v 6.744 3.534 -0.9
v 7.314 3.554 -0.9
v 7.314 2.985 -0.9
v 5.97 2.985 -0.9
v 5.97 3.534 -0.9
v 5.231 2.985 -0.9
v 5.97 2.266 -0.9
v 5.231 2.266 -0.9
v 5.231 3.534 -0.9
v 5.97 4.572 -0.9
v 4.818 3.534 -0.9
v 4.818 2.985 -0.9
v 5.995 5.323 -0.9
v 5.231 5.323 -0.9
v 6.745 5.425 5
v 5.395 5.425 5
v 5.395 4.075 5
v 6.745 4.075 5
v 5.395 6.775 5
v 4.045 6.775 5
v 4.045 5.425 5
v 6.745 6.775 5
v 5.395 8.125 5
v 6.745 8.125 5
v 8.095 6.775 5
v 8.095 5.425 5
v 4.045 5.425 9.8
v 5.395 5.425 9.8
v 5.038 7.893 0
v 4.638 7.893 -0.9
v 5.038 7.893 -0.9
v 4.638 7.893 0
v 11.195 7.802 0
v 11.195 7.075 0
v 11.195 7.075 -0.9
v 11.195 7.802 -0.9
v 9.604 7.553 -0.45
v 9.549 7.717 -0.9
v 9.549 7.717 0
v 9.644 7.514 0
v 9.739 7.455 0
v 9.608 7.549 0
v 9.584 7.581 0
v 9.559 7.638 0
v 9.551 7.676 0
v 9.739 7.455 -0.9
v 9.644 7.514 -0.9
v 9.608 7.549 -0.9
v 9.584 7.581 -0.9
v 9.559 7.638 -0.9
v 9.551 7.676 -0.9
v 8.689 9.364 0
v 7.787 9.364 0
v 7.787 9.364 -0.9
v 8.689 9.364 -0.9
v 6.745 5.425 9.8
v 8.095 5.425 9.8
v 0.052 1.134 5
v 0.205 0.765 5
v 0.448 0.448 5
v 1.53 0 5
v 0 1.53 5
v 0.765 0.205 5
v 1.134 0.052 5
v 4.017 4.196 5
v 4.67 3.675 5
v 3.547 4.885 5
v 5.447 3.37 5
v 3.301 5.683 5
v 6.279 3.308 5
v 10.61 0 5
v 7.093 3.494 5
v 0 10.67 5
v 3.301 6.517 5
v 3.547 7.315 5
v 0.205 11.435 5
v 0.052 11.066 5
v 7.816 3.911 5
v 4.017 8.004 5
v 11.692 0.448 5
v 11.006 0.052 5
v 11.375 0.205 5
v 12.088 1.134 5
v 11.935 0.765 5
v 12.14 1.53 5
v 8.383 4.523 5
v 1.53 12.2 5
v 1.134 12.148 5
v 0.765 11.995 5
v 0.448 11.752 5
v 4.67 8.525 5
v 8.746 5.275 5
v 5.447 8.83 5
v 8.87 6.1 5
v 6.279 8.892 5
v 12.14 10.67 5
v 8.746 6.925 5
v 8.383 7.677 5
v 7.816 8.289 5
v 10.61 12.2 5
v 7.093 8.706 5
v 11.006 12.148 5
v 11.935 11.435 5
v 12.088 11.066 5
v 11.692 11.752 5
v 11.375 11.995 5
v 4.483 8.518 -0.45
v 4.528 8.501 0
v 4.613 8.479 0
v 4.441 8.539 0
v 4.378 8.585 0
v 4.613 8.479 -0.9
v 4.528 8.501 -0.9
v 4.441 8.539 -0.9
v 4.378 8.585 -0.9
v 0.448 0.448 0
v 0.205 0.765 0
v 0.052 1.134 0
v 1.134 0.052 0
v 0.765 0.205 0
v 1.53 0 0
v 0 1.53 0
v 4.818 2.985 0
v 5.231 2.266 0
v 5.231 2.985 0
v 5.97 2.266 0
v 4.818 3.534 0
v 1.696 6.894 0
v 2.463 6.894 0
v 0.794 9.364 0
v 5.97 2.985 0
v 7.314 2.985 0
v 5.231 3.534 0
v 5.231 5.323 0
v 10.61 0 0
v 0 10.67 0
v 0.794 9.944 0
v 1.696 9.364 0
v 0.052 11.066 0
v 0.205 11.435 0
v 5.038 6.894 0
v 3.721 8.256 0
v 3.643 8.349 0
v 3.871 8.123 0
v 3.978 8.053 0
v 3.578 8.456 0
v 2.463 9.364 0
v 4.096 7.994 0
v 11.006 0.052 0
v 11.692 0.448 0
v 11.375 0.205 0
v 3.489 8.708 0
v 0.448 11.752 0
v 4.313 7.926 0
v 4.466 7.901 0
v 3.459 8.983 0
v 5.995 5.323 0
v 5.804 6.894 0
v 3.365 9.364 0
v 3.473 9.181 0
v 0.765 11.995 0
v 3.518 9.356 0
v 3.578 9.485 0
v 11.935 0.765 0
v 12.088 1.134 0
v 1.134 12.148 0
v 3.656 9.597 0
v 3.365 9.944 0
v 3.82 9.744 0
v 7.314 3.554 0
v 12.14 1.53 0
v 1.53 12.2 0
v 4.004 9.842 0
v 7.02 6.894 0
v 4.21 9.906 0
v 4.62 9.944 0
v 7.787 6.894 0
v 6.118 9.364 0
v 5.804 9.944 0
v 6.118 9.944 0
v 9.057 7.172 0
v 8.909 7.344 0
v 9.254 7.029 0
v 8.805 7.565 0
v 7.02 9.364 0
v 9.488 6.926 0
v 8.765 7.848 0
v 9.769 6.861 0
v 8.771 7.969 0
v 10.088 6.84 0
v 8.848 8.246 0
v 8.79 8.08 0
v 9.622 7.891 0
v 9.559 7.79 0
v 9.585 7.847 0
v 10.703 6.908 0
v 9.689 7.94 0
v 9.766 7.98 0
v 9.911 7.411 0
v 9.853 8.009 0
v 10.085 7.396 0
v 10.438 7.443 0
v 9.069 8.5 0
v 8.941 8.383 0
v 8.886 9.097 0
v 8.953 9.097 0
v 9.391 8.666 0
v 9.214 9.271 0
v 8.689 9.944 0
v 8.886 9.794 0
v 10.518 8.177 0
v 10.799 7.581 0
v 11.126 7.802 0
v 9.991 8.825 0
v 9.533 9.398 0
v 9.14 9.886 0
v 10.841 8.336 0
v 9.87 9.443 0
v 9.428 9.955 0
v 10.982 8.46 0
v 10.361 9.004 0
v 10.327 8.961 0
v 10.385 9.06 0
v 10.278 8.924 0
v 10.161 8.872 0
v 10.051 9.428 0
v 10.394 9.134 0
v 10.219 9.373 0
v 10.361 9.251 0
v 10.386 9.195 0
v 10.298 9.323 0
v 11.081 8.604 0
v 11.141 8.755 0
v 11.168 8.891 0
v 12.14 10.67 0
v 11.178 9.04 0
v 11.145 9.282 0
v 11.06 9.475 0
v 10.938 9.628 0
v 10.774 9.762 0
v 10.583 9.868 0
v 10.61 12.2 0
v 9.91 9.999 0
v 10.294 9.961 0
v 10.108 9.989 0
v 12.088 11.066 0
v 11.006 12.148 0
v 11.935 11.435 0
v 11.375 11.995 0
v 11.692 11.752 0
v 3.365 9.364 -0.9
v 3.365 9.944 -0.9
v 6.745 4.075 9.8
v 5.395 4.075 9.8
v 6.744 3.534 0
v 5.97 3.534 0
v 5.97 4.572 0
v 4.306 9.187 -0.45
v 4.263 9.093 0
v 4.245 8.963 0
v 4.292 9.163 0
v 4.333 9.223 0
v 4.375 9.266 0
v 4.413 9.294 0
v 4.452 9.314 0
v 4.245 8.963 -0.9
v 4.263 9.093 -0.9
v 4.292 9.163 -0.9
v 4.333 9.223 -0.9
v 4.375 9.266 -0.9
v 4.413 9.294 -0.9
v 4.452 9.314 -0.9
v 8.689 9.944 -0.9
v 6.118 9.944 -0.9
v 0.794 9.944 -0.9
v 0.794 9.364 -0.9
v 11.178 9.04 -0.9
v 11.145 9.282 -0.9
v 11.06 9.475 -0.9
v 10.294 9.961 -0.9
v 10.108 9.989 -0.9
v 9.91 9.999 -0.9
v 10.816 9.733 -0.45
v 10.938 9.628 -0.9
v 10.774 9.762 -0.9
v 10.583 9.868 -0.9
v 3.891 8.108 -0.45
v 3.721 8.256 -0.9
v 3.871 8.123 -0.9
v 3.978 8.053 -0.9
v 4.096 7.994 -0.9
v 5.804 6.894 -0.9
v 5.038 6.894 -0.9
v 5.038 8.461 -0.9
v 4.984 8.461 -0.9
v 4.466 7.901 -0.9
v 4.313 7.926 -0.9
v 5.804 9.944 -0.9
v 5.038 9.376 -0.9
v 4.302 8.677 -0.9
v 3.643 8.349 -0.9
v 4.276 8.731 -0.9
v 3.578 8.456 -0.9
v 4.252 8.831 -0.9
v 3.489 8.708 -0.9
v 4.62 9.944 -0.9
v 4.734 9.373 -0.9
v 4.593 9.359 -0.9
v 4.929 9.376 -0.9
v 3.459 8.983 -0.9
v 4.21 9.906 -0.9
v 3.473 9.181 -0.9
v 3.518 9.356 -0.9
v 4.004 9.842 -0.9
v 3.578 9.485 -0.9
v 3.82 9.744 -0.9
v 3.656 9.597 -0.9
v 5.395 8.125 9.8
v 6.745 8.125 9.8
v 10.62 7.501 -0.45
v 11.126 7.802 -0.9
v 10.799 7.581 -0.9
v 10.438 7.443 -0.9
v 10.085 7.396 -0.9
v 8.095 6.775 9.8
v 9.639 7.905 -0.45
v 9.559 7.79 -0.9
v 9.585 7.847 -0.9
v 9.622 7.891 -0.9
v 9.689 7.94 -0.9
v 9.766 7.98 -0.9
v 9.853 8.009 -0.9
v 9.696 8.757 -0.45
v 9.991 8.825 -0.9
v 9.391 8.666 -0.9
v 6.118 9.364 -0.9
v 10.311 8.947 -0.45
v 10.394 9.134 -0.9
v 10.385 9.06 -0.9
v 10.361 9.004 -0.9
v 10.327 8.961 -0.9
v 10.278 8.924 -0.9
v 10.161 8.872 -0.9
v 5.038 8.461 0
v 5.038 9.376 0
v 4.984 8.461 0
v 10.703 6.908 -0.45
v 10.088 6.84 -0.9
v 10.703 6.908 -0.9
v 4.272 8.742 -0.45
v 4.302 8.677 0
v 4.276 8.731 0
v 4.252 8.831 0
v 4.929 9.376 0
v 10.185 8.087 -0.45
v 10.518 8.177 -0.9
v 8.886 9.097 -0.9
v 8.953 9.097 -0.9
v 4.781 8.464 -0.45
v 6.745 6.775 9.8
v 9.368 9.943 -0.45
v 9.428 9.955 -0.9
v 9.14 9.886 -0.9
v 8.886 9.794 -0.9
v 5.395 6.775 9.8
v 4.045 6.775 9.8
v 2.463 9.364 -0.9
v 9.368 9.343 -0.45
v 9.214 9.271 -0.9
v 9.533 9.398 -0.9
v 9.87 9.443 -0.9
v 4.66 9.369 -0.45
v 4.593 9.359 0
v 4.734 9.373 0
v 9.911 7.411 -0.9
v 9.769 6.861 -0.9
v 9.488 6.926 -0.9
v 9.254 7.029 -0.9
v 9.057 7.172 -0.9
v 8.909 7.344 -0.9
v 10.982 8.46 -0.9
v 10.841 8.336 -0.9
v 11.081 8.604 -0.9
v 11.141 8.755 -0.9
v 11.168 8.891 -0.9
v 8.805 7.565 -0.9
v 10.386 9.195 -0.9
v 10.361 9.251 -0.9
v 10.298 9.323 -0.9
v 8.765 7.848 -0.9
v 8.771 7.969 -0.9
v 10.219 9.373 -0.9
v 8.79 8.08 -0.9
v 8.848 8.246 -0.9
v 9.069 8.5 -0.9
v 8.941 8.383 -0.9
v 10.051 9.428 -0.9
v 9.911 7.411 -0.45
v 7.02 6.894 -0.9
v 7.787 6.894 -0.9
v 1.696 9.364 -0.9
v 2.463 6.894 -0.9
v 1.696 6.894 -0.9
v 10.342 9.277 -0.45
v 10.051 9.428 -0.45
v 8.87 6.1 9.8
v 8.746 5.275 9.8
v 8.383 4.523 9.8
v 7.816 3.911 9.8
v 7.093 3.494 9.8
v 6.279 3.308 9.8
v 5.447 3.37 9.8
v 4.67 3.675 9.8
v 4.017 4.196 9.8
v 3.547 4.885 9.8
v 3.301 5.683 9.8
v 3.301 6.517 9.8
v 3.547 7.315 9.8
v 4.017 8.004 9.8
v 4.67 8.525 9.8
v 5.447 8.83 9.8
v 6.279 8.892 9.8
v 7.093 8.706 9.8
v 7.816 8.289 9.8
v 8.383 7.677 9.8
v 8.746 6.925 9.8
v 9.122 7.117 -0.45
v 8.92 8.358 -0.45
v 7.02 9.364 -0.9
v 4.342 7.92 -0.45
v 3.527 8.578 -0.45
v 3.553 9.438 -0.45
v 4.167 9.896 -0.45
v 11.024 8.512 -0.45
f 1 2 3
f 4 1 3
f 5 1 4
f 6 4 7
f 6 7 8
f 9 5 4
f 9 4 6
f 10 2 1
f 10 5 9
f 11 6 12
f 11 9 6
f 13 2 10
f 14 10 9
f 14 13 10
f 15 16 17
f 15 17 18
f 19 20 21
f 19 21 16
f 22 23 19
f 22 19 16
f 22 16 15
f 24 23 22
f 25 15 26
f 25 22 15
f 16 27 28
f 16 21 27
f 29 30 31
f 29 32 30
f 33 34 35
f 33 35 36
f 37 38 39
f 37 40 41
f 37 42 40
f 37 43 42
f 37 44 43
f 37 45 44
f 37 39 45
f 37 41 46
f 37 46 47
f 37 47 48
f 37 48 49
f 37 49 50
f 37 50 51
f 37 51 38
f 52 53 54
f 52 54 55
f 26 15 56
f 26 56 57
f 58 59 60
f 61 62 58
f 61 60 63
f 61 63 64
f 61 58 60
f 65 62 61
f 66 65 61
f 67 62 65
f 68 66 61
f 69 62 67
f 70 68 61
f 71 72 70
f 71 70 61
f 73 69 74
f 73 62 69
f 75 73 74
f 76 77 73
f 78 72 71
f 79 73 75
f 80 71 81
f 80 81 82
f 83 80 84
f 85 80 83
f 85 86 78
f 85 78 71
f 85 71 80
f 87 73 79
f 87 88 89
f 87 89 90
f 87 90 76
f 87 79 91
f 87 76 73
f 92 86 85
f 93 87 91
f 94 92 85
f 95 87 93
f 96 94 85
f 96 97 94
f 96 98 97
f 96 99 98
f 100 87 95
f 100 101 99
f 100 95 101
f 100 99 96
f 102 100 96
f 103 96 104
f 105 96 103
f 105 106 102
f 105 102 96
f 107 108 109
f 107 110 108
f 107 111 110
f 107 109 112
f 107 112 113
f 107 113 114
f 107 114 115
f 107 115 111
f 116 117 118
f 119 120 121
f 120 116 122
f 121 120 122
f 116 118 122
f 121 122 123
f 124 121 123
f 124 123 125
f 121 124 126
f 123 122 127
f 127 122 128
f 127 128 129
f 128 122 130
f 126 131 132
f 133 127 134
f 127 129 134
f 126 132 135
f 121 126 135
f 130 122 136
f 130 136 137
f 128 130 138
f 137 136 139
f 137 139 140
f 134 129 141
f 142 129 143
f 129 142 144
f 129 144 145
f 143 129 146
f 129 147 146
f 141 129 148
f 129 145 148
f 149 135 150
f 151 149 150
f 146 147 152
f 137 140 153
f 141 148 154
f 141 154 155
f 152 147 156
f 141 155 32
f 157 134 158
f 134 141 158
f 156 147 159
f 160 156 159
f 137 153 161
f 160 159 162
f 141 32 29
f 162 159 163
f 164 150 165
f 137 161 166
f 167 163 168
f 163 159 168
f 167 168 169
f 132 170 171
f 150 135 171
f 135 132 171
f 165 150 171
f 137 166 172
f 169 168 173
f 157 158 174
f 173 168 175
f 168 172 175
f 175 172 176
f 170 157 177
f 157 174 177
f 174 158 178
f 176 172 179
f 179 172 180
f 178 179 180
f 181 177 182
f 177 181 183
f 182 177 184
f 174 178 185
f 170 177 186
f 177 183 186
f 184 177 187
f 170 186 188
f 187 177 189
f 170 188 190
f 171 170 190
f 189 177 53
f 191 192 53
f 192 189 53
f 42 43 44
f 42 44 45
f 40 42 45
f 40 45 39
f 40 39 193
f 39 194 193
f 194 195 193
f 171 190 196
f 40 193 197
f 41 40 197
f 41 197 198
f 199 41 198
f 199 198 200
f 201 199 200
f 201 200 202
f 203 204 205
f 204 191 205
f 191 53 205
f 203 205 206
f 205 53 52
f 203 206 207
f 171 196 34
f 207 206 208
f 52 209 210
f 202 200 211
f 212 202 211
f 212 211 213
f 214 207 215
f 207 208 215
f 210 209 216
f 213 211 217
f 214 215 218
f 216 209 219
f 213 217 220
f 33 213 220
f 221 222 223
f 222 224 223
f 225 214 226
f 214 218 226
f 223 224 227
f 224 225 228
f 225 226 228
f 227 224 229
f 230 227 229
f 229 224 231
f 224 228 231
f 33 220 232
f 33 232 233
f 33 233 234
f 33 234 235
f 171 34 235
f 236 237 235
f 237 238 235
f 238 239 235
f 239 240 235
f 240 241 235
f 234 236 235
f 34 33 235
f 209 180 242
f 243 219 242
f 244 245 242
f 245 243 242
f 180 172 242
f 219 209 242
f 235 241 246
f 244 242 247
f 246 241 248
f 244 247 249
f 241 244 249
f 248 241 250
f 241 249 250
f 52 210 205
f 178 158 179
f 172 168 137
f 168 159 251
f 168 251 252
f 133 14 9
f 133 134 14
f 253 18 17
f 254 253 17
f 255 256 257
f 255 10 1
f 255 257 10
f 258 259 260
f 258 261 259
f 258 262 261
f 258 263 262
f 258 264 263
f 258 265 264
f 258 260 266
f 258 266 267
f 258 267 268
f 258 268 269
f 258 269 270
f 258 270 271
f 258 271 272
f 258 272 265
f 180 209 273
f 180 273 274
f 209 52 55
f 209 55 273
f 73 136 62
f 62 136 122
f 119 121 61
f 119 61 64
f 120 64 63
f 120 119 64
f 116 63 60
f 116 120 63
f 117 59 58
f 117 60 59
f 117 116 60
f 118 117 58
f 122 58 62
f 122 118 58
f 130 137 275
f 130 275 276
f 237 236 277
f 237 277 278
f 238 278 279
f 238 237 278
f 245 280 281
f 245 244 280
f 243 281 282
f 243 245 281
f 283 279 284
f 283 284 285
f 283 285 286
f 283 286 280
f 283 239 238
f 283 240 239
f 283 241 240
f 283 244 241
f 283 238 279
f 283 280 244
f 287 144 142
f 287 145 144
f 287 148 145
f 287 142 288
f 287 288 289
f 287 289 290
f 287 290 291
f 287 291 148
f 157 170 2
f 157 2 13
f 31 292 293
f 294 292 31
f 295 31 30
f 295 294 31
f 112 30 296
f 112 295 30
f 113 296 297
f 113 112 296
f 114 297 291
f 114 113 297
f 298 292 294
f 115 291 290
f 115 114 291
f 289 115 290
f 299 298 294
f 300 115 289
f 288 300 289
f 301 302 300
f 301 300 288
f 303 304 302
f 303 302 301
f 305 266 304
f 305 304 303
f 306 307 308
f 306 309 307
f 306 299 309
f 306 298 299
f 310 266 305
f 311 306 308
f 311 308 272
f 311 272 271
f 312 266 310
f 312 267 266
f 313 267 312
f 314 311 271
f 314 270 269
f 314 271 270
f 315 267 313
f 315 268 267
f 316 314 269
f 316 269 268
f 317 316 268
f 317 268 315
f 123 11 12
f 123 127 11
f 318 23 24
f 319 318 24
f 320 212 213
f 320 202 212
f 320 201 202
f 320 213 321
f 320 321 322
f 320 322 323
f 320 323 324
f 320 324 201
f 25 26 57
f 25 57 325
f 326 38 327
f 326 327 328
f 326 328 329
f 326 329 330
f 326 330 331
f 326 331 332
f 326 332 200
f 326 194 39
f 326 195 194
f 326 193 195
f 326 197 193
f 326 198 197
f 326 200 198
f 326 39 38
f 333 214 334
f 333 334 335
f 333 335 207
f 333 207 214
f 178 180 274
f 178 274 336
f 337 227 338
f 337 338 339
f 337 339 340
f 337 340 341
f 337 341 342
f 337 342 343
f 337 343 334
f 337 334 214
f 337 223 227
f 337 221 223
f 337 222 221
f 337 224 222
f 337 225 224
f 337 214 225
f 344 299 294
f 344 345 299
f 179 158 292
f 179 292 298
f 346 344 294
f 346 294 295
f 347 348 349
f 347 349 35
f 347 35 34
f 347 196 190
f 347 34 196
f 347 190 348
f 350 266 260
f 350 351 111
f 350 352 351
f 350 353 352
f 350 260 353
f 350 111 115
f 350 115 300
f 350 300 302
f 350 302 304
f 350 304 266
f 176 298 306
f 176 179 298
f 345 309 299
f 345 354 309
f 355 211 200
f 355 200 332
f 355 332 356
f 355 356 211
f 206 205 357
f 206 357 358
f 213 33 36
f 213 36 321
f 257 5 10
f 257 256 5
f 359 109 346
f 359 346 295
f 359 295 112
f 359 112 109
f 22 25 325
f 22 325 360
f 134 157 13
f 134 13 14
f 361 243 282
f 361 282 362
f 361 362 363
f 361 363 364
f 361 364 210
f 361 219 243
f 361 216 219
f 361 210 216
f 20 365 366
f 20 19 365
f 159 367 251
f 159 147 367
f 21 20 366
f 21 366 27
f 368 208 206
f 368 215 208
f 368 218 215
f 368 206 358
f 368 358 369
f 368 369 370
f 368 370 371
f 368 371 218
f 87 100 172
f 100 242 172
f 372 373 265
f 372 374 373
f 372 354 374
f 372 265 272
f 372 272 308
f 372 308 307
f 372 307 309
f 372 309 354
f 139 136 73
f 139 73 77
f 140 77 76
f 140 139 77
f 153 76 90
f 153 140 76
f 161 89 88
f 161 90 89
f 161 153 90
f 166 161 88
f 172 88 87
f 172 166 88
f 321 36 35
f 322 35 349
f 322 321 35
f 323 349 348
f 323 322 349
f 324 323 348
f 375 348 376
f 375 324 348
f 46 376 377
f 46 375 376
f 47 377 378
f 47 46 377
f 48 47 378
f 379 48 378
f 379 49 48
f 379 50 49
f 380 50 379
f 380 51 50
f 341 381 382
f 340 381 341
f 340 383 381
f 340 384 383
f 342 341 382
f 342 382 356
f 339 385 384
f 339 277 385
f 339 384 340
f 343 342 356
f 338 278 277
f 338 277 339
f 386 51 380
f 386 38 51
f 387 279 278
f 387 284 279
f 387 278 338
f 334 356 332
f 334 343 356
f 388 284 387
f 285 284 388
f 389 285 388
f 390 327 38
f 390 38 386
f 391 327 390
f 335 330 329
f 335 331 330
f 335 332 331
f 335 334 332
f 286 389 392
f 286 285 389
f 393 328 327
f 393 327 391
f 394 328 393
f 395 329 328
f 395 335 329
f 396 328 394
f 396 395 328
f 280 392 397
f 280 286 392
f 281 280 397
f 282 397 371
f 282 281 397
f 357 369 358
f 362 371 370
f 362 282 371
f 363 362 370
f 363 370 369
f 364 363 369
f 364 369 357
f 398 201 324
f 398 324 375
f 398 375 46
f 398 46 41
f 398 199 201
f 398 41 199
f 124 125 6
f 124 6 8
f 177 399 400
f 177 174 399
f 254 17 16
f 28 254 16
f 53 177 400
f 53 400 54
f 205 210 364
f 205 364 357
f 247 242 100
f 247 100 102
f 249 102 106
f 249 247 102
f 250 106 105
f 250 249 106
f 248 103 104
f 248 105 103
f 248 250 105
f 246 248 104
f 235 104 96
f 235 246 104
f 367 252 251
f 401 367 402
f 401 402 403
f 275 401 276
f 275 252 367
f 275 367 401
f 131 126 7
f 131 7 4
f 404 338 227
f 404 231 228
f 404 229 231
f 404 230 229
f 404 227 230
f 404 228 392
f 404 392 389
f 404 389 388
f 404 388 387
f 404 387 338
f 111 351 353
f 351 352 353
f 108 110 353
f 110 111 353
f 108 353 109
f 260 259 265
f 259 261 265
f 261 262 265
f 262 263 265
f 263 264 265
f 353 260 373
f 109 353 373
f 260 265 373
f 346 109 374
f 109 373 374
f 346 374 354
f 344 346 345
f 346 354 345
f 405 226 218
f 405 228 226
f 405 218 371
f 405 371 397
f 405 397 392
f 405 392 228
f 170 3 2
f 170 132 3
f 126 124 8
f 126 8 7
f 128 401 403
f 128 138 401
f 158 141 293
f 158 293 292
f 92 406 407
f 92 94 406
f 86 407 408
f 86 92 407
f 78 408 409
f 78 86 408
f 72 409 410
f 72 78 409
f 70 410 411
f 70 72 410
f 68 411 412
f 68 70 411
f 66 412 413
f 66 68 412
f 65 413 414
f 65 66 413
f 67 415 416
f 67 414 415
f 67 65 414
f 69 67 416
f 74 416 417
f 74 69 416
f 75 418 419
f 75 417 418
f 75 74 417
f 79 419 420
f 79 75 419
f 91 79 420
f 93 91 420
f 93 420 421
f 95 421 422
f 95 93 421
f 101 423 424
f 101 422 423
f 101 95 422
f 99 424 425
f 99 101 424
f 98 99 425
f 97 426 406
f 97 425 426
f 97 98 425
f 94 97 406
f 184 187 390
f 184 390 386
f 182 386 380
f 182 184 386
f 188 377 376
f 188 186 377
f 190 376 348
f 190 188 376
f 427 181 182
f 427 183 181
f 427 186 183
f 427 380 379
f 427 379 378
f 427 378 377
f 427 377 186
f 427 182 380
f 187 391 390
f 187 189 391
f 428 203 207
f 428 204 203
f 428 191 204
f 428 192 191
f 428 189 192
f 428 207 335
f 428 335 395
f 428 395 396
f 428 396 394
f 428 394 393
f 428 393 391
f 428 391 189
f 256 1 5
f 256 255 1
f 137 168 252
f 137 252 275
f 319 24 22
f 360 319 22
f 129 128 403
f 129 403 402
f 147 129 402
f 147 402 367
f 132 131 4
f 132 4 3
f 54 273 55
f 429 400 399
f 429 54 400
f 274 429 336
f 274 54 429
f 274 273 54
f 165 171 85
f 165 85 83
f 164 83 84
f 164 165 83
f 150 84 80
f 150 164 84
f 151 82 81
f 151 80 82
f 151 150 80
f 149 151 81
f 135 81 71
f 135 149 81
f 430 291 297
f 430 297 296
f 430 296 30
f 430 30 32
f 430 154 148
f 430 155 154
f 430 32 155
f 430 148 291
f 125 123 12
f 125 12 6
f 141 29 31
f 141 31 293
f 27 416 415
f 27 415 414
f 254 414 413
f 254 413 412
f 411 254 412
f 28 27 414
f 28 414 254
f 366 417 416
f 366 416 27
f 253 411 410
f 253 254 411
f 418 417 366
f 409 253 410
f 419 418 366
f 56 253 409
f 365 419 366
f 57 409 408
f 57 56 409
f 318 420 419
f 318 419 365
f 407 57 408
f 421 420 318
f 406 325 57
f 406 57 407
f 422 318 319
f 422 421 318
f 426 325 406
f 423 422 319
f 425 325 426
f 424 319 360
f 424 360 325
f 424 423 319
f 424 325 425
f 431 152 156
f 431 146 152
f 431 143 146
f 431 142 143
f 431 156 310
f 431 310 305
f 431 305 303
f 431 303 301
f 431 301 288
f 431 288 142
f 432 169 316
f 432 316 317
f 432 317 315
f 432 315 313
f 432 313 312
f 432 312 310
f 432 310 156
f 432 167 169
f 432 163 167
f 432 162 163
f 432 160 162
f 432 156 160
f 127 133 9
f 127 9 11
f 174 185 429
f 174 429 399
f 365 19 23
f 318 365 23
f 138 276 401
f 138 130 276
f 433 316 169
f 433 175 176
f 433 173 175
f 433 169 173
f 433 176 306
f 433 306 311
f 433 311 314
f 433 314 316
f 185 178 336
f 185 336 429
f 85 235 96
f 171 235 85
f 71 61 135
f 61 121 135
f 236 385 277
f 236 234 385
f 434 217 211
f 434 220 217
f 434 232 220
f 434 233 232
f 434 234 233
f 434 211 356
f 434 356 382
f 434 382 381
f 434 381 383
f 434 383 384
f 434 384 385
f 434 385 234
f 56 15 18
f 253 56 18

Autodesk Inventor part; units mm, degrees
ref_plane "YZ Plane" through (0, 0, 0) normal (1, 0, 0) x (0, 1, 0)
ref_plane "XZ Plane" through (0, 0, 0) normal (0, 1, 0) x (-1, 0, 0)
sketch "Sketch1" plane through (0, 0, 0) normal (0, 0, 1) x (1, 0, 0)
  line L0 (14.6962, 12.74) -> (14.6962, 0) construction
  line L1 (10.61, 12.2) -> (1.53, 12.2)
  arc A0 (1.53, 12.2) -> (0, 10.67) centre (1.53, 10.67) ccw
  line L2 (0, 10.67) -> (0, 1.53)
  arc A1 (0, 1.53) -> (1.53, 0) centre (1.53, 1.53) ccw
  line L3 (1.53, 0) -> (10.61, 0)
  arc A2 (10.61, 0) -> (12.14, 1.53) centre (10.61, 1.53) ccw
  arc A3 (12.14, 10.67) -> (10.61, 12.2) centre (10.61, 10.67) ccw
  line L4 (12.14, 10.67) -> (12.14, 1.53)
  point P0 (0, 0)
  point P1 (0, 0)
  dimension "d10" = 12.74
ref_plane "Work Plane1" through (0, 0, 5) normal (0, 0, 1) x (1, 0, 0)
sketch "Sketch2" plane through (0, 0, 5) normal (0, 0, 1) x (1, 0, 0)
  line L0 (10.88, 12.74) -> (1.8, 12.74) projected
  line L1 (10.88, 12.74) -> (1.8, 12.74) projected
  arc A0 (1.8, 12.74) -> (0, 10.94) centre (1.8, 10.94) ccw projected
  line L2 (0, 10.94) -> (0, 1.8) projected
  arc A1 (0, 1.8) -> (1.8, 0) centre (1.8, 1.8) ccw projected
  line L3 (1.8, 0) -> (10.88, 0) projected
  arc A2 (10.88, 0) -> (12.68, 1.8) centre (10.88, 1.8) ccw projected
  line L4 (12.68, 1.8) -> (12.68, 10.94) projected
  arc A3 (12.68, 10.94) -> (10.88, 12.74) centre (10.88, 10.94) ccw projected
  circle A4 centre (6.34, 6.37) radius 2.8
  line L5 (5.665, 8.395) -> (7.015, 8.395)
  line L6 (7.015, 4.345) -> (5.665, 4.345)
  line L7 (5.665, 4.345) -> (7.015, 8.395) construction
  line L8 (5.665, 8.395) -> (7.015, 4.345) construction
  line L9 (8.365, 5.695) -> (8.365, 7.045)
  line L10 (4.315, 7.045) -> (4.315, 5.695)
  line L11 (4.315, 5.695) -> (8.365, 7.045) construction
  line L12 (8.365, 5.695) -> (4.315, 7.045) construction
  line L13 (4.315, 5.695) -> (5.665, 5.695)
  line L14 (7.015, 5.695) -> (8.365, 5.695)
  line L15 (5.665, 4.345) -> (5.665, 5.695)
  line L16 (5.665, 7.045) -> (5.665, 8.395)
  line L17 (8.365, 7.045) -> (7.015, 7.045)
  line L18 (5.665, 7.045) -> (4.315, 7.045)
  line L19 (7.015, 8.395) -> (7.015, 7.045)
  line L20 (7.015, 5.695) -> (7.015, 4.345)
  point P0 (0, 0)
  dimension "d12" = 5
  dimension "d3" = 5.6
  dimension "d4" = 4.05
  dimension "d5" = 1.35
  dimension "d6" = 4.05
  dimension "d7" = 1.35
extrude "Extrusion3" add sketch "Sketch1" along normal blind 5
sketch "Sketch3" plane through (0, 0, 5) normal (0, 0, 1) x (1, 0, 0)
  line L0 (10.61, 12.47) -> (1.53, 12.47)
  line L1 (10.61, 12.47) -> (1.53, 12.47)
  arc A0 (1.53, 12.47) -> (-0.27, 10.67) centre (1.53, 10.67) ccw
  line L2 (-0.27, 10.67) -> (-0.27, 1.53)
  arc A1 (-0.27, 1.53) -> (1.53, -0.27) centre (1.53, 1.53) ccw
  line L3 (1.53, -0.27) -> (10.61, -0.27)
  arc A2 (10.61, -0.27) -> (12.41, 1.53) centre (10.61, 1.53) ccw
  line L4 (12.41, 1.53) -> (12.41, 10.67)
  arc A3 (12.41, 10.67) -> (10.61, 12.47) centre (10.61, 10.67) ccw
  circle A4 centre (6.07, 6.1) radius 2.8
  line L5 (5.395, 8.125) -> (6.745, 8.125)
  line L6 (6.745, 4.075) -> (5.395, 4.075)
  line L7 (5.395, 4.075) -> (6.745, 8.125) construction
  line L8 (5.395, 8.125) -> (6.745, 4.075) construction
  line L9 (8.095, 5.425) -> (8.095, 6.775)
  line L10 (4.045, 6.775) -> (4.045, 5.425)
  line L11 (4.045, 5.425) -> (8.095, 6.775) construction
  line L12 (8.095, 5.425) -> (4.045, 6.775) construction
  line L13 (4.045, 5.425) -> (5.395, 5.425)
  line L14 (6.745, 5.425) -> (8.095, 5.425)
  line L15 (5.395, 4.075) -> (5.395, 5.425)
  line L16 (5.395, 6.775) -> (5.395, 8.125)
  line L17 (8.095, 6.775) -> (6.745, 6.775)
  line L18 (5.395, 6.775) -> (4.045, 6.775)
  line L19 (6.745, 8.125) -> (6.745, 6.775)
  line L20 (6.745, 5.425) -> (6.745, 4.075)
  line L21 (10.61, 12.2) -> (1.53, 12.2) projected
  line L22 (0, 10.67) -> (0, 1.53) projected
  point P0 (0, 0)
  point P1 (-0.27, -0.27)
  point P2 (6.07, 12.2)
  point P3 (0, 6.1)
  point P4 (6.07, 6.1)
  dimension "d14" = 5.6
  dimension "d15" = 4.05
  dimension "d16" = 1.35
  dimension "d17" = 4.05
  dimension "d18" = 1.35
extrude "Extrusion4" add sketch "Sketch3" along normal blind 4.8 contours A4
sketch "Sketch4" plane through (0, 0, 0) normal (0, 0, -1) x (-1, 0, 0)
  line L0 (-13.9436, 0) -> (-13.9436, 2.266)
  line L1 (-15.5559, 0) -> (-15.5559, 6.84)
  line L2 (-1.53, 0) -> (-10.61, 0) projected
  line L3 (-11.3457, 9.9988) -> (-0.7943, 9.9988) construction
  line L4 (-0.7943, 9.9988) -> (-0.7943, 6.84) construction
  line L5 (-0.7943, 6.84) -> (-11.3457, 6.84) construction
  line L6 (-11.3457, 6.84) -> (-11.3457, 9.9988) construction
  line L7 (-7.4059, 5.3234) -> (-4.7341, 5.3234) construction
  line L8 (-4.7341, 5.3234) -> (-4.7341, 2.266) construction
  line L9 (-4.7341, 2.266) -> (-7.4059, 2.266) construction
  line L10 (-7.4059, 2.266) -> (-7.4059, 5.3234) construction
  spline S0 degree 2 poles (-10.0876, 6.84) (-10.4386, 6.84) (-10.9675, 6.9759) (-11.1949, 7.0748) knots 0 0 0 1 2 2 2
  line L11 (-11.1949, 7.0748) -> (-11.1949, 7.8015)
  line L12 (-11.1949, 7.8015) -> (-11.1257, 7.8015)
  spline S1 degree 2 poles (-11.1257, 7.8015) (-10.8959, 7.6062) (-10.3447, 7.3961) (-10.0852, 7.3961) knots 0 0 0 1 2 2 2
  spline S2 degree 2 poles (-10.0852, 7.3961) (-10.0184, 7.3961) (-9.8034, 7.4258) (-9.7391, 7.4554) knots 0 0 0 1 2 2 2
  spline S3 degree 2 poles (-9.7391, 7.4554) (-9.6601, 7.49) (-9.5488, 7.6161) (-9.5488, 7.7174) knots 0 0 0 1 2 2 2
  spline S4 degree 2 poles (-9.5488, 7.7174) (-9.5488, 7.8336) (-9.7293, 7.977) (-9.8528, 8.0091) knots 0 0 0 1 2 2 2
  spline S5 degree 2 poles (-9.8528, 8.0091) (-10.0086, 8.0511) (-10.362, 8.1228) (-10.5177, 8.1772) knots 0 0 0 1 2 2 2
  spline S6 degree 2 poles (-10.5177, 8.1772) (-10.8712, 8.3007) (-11.1776, 8.7234) (-11.1776, 9.0398) knots 0 0 0 1 2 2 2
  spline S7 degree 2 poles (-11.1776, 9.0398) (-11.1776, 9.4674) (-10.4534, 9.9988) (-9.9097, 9.9988) knots 0 0 0 1 2 2 2
  spline S8 degree 2 poles (-9.9097, 9.9988) (-9.6378, 9.9988) (-9.099, 9.8875) (-8.8864, 9.7936) knots 0 0 0 1 2 2 2
  line L13 (-8.8864, 9.7936) -> (-8.8864, 9.0966)
  line L14 (-8.8864, 9.0966) -> (-8.9532, 9.0966)
  spline S9 degree 2 poles (-8.9532, 9.0966) (-9.1237, 9.2424) (-9.6131, 9.4426) (-9.8701, 9.4426) knots 0 0 0 1 2 2 2
  spline S10 degree 2 poles (-9.8701, 9.4426) (-9.9715, 9.4426) (-10.1297, 9.413) (-10.2186, 9.3734) knots 0 0 0 1 2 2 2
  spline S11 degree 2 poles (-10.2186, 9.3734) (-10.2903, 9.3413) (-10.3941, 9.2128) (-10.3941, 9.1337) knots 0 0 0 1 2 2 2
  spline S12 degree 2 poles (-10.3941, 9.1337) (-10.3941, 9.015) (-10.2285, 8.8791) (-9.9913, 8.8247) knots 0 0 0 1 2 2 2
  spline S13 degree 2 poles (-9.9913, 8.8247) (-9.838, 8.7901) (-9.5538, 8.7234) (-9.3906, 8.6665) knots 0 0 0 1 2 2 2
  spline S14 degree 2 poles (-9.3906, 8.6665) (-9.0743, 8.5504) (-8.7653, 8.1648) (-8.7653, 7.8484) knots 0 0 0 1 2 2 2
  spline S15 degree 2 poles (-8.7653, 7.8484) (-8.7653, 7.3936) (-9.4796, 6.84) (-10.0876, 6.84) knots 0 0 0 1 2 2 2
  line L15 (-7.7866, 6.8944) -> (-7.7866, 9.3635)
  line L16 (-7.7866, 9.3635) -> (-8.6887, 9.3635)
  line L17 (-8.6887, 9.3635) -> (-8.6887, 9.9444)
  line L18 (-8.6887, 9.9444) -> (-6.1182, 9.9444)
  line L19 (-6.1182, 9.9444) -> (-6.1182, 9.3635)
  line L20 (-6.1182, 9.3635) -> (-7.0203, 9.3635)
  line L21 (-7.0203, 9.3635) -> (-7.0203, 6.8944)
  line L22 (-7.0203, 6.8944) -> (-7.7866, 6.8944)
  spline S16 degree 2 poles (-3.4587, 8.9829) (-3.4587, 8.7703) (-3.5947, 8.3848) (-3.7207, 8.2562) knots 0 0 0 1 2 2 2
  spline S17 degree 2 poles (-3.7207, 8.2562) (-3.7973, 8.1747) (-3.9852, 8.0412) (-4.0964, 7.9943) knots 0 0 0 1 2 2 2
  spline S18 degree 2 poles (-4.0964, 7.9943) (-4.2101, 7.9473) (-4.4746, 7.8929) (-4.6377, 7.8929) knots 0 0 0 1 2 2 2
  line L23 (-4.6377, 7.8929) -> (-5.0381, 7.8929)
  line L24 (-5.0381, 7.8929) -> (-5.0381, 6.8944)
  line L25 (-5.0381, 6.8944) -> (-5.8043, 6.8944)
  line L26 (-5.8043, 6.8944) -> (-5.8043, 9.9444)
  line L27 (-5.8043, 9.9444) -> (-4.6204, 9.9444)
  spline S19 degree 2 poles (-4.6204, 9.9444) (-4.3584, 9.9444) (-3.9753, 9.848) (-3.8196, 9.7442) knots 0 0 0 1 2 2 2
  spline S20 degree 2 poles (-3.8196, 9.7442) (-3.6466, 9.628) (-3.4587, 9.2474) (-3.4587, 8.9829) knots 0 0 0 1 2 2 2
  spline S21 degree 2 poles (-4.2447, 8.9631) (-4.2447, 9.0941) (-4.3683, 9.2795) (-4.4523, 9.3141) knots 0 0 0 1 2 2 2
  spline S22 degree 2 poles (-4.4523, 9.3141) (-4.5611, 9.3611) (-4.7588, 9.3759) (-4.9293, 9.3759) knots 0 0 0 1 2 2 2
  line L28 (-4.9293, 9.3759) -> (-5.0381, 9.3759)
  line L29 (-5.0381, 9.3759) -> (-5.0381, 8.4614)
  line L30 (-5.0381, 8.4614) -> (-4.9837, 8.4614)
  spline S23 degree 2 poles (-4.9837, 8.4614) (-4.8774, 8.4614) (-4.6846, 8.4663) (-4.613, 8.4787) knots 0 0 0 1 2 2 2
  spline S24 degree 2 poles (-4.613, 8.4787) (-4.5512, 8.4886) (-4.4152, 8.5479) (-4.3782, 8.585) knots 0 0 0 1 2 2 2
  spline S25 degree 2 poles (-4.3782, 8.585) (-4.2991, 8.6591) (-4.2447, 8.8247) (-4.2447, 8.9631) knots 0 0 0 1 2 2 2
  line L31 (-2.4626, 6.8944) -> (-2.4626, 9.3635)
  line L32 (-2.4626, 9.3635) -> (-3.3648, 9.3635)
  line L33 (-3.3648, 9.3635) -> (-3.3648, 9.9444)
  line L34 (-3.3648, 9.9444) -> (-0.7943, 9.9444)
  line L35 (-0.7943, 9.9444) -> (-0.7943, 9.3635)
  line L36 (-0.7943, 9.3635) -> (-1.6964, 9.3635)
  line L37 (-1.6964, 9.3635) -> (-1.6964, 6.8944)
  line L38 (-1.6964, 6.8944) -> (-2.4626, 6.8944)
  line L39 (-4.8181, 2.9852) -> (-5.2309, 2.9852)
  line L40 (-5.2309, 2.9852) -> (-5.2309, 2.266)
  line L41 (-5.2309, 2.266) -> (-5.9699, 2.266)
  line L42 (-5.9699, 2.266) -> (-5.9699, 2.9852)
  line L43 (-5.9699, 2.9852) -> (-7.3145, 2.9852)
  line L44 (-7.3145, 2.9852) -> (-7.3145, 3.5537)
  line L45 (-7.3145, 3.5537) -> (-5.9946, 5.3234)
  line L46 (-5.9946, 5.3234) -> (-5.2309, 5.3234)
  line L47 (-5.2309, 5.3234) -> (-5.2309, 3.5339)
  line L48 (-5.2309, 3.5339) -> (-4.8181, 3.5339)
  line L49 (-4.8181, 3.5339) -> (-4.8181, 2.9852)
  line L50 (-5.9699, 3.5339) -> (-5.9699, 4.572)
  line L51 (-5.9699, 4.572) -> (-6.7435, 3.5339)
  line L52 (-6.7435, 3.5339) -> (-5.9699, 3.5339)
  point P0 (0, 0)
  point P1 (-6.07, 0)
  point P2 (-6.07, 2.266)
  point P3 (-6.07, 6.84)
  point P4 (-6.07, 6.84)
  point P5 (-6.07, 2.266)
  dimension "d21" = 2.266
  dimension "d22" = 6.84
sketch "Sketch5" plane through (0, 0, 0) normal (0, 0, -1) x (-1, 0, 0)
  point P0 (0, 0)
extrude "Extrusion5" add sketch "Sketch4" along normal blind 0.9
properties part number "IPC STPT 4 key"
